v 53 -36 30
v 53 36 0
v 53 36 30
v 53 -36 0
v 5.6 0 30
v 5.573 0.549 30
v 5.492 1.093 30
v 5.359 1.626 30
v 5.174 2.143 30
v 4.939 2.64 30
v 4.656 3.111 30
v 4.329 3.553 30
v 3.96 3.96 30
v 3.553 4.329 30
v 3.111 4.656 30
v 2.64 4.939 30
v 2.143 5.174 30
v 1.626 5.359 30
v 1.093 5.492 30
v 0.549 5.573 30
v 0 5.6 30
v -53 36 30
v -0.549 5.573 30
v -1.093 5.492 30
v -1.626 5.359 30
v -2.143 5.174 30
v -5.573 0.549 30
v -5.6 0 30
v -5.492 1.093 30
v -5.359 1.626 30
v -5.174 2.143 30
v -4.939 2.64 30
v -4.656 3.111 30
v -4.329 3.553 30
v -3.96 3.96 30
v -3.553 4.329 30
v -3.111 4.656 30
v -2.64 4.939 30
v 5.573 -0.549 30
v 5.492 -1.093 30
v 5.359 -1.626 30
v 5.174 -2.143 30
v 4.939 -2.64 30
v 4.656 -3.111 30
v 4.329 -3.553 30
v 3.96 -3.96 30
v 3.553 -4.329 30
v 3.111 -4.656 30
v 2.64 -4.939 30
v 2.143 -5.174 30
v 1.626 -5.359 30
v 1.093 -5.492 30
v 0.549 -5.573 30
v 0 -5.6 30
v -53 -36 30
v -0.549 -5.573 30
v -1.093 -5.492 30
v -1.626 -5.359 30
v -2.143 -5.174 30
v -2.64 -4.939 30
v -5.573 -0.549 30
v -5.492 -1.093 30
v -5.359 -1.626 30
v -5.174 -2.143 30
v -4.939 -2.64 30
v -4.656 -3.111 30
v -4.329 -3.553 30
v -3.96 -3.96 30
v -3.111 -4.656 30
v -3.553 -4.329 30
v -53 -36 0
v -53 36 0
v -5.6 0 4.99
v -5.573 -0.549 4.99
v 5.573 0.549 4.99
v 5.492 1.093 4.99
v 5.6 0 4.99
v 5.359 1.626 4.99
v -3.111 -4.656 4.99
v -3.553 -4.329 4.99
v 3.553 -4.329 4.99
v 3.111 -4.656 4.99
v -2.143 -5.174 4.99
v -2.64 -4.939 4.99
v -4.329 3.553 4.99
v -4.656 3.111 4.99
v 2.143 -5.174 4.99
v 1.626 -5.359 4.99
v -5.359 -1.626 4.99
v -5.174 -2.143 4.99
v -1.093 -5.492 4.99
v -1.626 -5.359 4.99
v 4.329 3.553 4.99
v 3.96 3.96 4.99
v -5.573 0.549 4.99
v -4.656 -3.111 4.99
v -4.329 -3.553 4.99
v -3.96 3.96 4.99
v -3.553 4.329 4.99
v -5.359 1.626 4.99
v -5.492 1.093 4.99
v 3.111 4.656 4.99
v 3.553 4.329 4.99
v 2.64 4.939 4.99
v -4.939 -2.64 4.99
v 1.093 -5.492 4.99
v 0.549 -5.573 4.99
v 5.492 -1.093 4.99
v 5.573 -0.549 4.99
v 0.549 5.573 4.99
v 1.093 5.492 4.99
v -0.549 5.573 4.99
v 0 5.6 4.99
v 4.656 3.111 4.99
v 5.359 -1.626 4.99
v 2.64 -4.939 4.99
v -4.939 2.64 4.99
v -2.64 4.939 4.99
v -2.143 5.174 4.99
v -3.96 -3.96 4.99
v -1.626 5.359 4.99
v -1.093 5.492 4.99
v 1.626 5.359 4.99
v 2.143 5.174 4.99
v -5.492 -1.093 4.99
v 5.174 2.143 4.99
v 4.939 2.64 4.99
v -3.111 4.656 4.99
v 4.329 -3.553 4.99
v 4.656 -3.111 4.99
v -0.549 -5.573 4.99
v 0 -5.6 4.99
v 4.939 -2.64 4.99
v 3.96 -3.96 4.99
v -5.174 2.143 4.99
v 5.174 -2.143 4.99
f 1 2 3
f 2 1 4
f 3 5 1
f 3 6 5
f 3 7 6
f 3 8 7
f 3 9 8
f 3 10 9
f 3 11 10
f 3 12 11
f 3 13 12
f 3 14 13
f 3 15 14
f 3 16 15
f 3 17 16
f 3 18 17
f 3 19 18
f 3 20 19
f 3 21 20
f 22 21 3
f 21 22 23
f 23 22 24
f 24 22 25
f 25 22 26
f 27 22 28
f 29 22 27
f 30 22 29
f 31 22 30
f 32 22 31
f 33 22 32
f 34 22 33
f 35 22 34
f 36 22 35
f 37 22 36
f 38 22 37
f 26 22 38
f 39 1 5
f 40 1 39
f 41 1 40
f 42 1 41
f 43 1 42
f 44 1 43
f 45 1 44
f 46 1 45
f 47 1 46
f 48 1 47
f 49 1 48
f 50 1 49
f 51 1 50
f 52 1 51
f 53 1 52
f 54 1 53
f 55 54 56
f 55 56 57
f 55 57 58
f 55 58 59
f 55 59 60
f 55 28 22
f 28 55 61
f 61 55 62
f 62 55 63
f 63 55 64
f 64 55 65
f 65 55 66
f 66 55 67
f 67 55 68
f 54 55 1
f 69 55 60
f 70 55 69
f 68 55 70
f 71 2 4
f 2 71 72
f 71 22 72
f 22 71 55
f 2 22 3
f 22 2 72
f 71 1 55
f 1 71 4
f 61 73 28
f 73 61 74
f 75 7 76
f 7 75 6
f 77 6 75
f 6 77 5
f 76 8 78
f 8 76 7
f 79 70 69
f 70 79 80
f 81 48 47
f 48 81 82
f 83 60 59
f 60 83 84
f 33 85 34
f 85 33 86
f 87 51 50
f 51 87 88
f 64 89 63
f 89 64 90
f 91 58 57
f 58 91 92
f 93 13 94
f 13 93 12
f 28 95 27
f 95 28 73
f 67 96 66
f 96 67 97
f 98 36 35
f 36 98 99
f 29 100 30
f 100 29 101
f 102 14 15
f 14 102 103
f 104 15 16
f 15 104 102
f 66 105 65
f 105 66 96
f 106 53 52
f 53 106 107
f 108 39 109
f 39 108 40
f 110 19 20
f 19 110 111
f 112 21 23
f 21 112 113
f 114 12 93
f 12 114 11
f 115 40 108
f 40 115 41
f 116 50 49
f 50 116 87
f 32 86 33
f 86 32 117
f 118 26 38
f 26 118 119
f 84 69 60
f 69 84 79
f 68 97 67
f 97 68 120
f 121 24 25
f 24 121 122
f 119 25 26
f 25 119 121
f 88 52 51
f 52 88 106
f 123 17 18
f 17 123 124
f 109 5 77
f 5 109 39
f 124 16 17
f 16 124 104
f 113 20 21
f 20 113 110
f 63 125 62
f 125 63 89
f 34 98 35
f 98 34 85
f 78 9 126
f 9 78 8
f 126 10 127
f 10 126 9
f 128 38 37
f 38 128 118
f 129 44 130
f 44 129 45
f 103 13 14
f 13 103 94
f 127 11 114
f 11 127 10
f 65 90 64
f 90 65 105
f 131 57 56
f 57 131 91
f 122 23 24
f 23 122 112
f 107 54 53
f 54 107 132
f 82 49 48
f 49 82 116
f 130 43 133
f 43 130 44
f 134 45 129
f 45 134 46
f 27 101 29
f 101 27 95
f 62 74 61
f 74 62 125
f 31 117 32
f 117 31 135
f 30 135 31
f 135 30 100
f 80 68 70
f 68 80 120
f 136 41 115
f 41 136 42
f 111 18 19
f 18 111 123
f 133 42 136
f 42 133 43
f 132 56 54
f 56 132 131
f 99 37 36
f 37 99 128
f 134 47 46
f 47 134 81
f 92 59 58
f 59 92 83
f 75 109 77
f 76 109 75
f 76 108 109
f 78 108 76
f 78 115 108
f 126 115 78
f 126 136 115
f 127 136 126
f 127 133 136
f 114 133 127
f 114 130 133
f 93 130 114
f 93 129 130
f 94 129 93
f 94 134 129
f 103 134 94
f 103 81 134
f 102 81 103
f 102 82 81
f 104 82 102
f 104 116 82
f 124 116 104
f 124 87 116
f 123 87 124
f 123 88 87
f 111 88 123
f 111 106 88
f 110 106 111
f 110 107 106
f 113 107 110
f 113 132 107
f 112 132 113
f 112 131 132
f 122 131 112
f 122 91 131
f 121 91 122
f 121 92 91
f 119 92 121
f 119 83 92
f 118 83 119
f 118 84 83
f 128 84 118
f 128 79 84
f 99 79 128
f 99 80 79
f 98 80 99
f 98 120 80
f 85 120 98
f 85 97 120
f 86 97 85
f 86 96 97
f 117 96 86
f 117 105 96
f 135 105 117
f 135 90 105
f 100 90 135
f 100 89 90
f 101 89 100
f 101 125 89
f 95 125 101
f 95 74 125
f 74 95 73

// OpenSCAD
// Built by bench/smallmodels/features/compiler.py from a list of features.
$fn = 64;
difference() {
  union() {
    translate([0, 0, 0]) translate([-53, -36, 0]) cube([106, 72, 30]);
  }
  union() {
    translate([0, 0, 4.99]) rotate([0, 0, 0]) cylinder(d = 11.2, h = 25.02);
  }
}
